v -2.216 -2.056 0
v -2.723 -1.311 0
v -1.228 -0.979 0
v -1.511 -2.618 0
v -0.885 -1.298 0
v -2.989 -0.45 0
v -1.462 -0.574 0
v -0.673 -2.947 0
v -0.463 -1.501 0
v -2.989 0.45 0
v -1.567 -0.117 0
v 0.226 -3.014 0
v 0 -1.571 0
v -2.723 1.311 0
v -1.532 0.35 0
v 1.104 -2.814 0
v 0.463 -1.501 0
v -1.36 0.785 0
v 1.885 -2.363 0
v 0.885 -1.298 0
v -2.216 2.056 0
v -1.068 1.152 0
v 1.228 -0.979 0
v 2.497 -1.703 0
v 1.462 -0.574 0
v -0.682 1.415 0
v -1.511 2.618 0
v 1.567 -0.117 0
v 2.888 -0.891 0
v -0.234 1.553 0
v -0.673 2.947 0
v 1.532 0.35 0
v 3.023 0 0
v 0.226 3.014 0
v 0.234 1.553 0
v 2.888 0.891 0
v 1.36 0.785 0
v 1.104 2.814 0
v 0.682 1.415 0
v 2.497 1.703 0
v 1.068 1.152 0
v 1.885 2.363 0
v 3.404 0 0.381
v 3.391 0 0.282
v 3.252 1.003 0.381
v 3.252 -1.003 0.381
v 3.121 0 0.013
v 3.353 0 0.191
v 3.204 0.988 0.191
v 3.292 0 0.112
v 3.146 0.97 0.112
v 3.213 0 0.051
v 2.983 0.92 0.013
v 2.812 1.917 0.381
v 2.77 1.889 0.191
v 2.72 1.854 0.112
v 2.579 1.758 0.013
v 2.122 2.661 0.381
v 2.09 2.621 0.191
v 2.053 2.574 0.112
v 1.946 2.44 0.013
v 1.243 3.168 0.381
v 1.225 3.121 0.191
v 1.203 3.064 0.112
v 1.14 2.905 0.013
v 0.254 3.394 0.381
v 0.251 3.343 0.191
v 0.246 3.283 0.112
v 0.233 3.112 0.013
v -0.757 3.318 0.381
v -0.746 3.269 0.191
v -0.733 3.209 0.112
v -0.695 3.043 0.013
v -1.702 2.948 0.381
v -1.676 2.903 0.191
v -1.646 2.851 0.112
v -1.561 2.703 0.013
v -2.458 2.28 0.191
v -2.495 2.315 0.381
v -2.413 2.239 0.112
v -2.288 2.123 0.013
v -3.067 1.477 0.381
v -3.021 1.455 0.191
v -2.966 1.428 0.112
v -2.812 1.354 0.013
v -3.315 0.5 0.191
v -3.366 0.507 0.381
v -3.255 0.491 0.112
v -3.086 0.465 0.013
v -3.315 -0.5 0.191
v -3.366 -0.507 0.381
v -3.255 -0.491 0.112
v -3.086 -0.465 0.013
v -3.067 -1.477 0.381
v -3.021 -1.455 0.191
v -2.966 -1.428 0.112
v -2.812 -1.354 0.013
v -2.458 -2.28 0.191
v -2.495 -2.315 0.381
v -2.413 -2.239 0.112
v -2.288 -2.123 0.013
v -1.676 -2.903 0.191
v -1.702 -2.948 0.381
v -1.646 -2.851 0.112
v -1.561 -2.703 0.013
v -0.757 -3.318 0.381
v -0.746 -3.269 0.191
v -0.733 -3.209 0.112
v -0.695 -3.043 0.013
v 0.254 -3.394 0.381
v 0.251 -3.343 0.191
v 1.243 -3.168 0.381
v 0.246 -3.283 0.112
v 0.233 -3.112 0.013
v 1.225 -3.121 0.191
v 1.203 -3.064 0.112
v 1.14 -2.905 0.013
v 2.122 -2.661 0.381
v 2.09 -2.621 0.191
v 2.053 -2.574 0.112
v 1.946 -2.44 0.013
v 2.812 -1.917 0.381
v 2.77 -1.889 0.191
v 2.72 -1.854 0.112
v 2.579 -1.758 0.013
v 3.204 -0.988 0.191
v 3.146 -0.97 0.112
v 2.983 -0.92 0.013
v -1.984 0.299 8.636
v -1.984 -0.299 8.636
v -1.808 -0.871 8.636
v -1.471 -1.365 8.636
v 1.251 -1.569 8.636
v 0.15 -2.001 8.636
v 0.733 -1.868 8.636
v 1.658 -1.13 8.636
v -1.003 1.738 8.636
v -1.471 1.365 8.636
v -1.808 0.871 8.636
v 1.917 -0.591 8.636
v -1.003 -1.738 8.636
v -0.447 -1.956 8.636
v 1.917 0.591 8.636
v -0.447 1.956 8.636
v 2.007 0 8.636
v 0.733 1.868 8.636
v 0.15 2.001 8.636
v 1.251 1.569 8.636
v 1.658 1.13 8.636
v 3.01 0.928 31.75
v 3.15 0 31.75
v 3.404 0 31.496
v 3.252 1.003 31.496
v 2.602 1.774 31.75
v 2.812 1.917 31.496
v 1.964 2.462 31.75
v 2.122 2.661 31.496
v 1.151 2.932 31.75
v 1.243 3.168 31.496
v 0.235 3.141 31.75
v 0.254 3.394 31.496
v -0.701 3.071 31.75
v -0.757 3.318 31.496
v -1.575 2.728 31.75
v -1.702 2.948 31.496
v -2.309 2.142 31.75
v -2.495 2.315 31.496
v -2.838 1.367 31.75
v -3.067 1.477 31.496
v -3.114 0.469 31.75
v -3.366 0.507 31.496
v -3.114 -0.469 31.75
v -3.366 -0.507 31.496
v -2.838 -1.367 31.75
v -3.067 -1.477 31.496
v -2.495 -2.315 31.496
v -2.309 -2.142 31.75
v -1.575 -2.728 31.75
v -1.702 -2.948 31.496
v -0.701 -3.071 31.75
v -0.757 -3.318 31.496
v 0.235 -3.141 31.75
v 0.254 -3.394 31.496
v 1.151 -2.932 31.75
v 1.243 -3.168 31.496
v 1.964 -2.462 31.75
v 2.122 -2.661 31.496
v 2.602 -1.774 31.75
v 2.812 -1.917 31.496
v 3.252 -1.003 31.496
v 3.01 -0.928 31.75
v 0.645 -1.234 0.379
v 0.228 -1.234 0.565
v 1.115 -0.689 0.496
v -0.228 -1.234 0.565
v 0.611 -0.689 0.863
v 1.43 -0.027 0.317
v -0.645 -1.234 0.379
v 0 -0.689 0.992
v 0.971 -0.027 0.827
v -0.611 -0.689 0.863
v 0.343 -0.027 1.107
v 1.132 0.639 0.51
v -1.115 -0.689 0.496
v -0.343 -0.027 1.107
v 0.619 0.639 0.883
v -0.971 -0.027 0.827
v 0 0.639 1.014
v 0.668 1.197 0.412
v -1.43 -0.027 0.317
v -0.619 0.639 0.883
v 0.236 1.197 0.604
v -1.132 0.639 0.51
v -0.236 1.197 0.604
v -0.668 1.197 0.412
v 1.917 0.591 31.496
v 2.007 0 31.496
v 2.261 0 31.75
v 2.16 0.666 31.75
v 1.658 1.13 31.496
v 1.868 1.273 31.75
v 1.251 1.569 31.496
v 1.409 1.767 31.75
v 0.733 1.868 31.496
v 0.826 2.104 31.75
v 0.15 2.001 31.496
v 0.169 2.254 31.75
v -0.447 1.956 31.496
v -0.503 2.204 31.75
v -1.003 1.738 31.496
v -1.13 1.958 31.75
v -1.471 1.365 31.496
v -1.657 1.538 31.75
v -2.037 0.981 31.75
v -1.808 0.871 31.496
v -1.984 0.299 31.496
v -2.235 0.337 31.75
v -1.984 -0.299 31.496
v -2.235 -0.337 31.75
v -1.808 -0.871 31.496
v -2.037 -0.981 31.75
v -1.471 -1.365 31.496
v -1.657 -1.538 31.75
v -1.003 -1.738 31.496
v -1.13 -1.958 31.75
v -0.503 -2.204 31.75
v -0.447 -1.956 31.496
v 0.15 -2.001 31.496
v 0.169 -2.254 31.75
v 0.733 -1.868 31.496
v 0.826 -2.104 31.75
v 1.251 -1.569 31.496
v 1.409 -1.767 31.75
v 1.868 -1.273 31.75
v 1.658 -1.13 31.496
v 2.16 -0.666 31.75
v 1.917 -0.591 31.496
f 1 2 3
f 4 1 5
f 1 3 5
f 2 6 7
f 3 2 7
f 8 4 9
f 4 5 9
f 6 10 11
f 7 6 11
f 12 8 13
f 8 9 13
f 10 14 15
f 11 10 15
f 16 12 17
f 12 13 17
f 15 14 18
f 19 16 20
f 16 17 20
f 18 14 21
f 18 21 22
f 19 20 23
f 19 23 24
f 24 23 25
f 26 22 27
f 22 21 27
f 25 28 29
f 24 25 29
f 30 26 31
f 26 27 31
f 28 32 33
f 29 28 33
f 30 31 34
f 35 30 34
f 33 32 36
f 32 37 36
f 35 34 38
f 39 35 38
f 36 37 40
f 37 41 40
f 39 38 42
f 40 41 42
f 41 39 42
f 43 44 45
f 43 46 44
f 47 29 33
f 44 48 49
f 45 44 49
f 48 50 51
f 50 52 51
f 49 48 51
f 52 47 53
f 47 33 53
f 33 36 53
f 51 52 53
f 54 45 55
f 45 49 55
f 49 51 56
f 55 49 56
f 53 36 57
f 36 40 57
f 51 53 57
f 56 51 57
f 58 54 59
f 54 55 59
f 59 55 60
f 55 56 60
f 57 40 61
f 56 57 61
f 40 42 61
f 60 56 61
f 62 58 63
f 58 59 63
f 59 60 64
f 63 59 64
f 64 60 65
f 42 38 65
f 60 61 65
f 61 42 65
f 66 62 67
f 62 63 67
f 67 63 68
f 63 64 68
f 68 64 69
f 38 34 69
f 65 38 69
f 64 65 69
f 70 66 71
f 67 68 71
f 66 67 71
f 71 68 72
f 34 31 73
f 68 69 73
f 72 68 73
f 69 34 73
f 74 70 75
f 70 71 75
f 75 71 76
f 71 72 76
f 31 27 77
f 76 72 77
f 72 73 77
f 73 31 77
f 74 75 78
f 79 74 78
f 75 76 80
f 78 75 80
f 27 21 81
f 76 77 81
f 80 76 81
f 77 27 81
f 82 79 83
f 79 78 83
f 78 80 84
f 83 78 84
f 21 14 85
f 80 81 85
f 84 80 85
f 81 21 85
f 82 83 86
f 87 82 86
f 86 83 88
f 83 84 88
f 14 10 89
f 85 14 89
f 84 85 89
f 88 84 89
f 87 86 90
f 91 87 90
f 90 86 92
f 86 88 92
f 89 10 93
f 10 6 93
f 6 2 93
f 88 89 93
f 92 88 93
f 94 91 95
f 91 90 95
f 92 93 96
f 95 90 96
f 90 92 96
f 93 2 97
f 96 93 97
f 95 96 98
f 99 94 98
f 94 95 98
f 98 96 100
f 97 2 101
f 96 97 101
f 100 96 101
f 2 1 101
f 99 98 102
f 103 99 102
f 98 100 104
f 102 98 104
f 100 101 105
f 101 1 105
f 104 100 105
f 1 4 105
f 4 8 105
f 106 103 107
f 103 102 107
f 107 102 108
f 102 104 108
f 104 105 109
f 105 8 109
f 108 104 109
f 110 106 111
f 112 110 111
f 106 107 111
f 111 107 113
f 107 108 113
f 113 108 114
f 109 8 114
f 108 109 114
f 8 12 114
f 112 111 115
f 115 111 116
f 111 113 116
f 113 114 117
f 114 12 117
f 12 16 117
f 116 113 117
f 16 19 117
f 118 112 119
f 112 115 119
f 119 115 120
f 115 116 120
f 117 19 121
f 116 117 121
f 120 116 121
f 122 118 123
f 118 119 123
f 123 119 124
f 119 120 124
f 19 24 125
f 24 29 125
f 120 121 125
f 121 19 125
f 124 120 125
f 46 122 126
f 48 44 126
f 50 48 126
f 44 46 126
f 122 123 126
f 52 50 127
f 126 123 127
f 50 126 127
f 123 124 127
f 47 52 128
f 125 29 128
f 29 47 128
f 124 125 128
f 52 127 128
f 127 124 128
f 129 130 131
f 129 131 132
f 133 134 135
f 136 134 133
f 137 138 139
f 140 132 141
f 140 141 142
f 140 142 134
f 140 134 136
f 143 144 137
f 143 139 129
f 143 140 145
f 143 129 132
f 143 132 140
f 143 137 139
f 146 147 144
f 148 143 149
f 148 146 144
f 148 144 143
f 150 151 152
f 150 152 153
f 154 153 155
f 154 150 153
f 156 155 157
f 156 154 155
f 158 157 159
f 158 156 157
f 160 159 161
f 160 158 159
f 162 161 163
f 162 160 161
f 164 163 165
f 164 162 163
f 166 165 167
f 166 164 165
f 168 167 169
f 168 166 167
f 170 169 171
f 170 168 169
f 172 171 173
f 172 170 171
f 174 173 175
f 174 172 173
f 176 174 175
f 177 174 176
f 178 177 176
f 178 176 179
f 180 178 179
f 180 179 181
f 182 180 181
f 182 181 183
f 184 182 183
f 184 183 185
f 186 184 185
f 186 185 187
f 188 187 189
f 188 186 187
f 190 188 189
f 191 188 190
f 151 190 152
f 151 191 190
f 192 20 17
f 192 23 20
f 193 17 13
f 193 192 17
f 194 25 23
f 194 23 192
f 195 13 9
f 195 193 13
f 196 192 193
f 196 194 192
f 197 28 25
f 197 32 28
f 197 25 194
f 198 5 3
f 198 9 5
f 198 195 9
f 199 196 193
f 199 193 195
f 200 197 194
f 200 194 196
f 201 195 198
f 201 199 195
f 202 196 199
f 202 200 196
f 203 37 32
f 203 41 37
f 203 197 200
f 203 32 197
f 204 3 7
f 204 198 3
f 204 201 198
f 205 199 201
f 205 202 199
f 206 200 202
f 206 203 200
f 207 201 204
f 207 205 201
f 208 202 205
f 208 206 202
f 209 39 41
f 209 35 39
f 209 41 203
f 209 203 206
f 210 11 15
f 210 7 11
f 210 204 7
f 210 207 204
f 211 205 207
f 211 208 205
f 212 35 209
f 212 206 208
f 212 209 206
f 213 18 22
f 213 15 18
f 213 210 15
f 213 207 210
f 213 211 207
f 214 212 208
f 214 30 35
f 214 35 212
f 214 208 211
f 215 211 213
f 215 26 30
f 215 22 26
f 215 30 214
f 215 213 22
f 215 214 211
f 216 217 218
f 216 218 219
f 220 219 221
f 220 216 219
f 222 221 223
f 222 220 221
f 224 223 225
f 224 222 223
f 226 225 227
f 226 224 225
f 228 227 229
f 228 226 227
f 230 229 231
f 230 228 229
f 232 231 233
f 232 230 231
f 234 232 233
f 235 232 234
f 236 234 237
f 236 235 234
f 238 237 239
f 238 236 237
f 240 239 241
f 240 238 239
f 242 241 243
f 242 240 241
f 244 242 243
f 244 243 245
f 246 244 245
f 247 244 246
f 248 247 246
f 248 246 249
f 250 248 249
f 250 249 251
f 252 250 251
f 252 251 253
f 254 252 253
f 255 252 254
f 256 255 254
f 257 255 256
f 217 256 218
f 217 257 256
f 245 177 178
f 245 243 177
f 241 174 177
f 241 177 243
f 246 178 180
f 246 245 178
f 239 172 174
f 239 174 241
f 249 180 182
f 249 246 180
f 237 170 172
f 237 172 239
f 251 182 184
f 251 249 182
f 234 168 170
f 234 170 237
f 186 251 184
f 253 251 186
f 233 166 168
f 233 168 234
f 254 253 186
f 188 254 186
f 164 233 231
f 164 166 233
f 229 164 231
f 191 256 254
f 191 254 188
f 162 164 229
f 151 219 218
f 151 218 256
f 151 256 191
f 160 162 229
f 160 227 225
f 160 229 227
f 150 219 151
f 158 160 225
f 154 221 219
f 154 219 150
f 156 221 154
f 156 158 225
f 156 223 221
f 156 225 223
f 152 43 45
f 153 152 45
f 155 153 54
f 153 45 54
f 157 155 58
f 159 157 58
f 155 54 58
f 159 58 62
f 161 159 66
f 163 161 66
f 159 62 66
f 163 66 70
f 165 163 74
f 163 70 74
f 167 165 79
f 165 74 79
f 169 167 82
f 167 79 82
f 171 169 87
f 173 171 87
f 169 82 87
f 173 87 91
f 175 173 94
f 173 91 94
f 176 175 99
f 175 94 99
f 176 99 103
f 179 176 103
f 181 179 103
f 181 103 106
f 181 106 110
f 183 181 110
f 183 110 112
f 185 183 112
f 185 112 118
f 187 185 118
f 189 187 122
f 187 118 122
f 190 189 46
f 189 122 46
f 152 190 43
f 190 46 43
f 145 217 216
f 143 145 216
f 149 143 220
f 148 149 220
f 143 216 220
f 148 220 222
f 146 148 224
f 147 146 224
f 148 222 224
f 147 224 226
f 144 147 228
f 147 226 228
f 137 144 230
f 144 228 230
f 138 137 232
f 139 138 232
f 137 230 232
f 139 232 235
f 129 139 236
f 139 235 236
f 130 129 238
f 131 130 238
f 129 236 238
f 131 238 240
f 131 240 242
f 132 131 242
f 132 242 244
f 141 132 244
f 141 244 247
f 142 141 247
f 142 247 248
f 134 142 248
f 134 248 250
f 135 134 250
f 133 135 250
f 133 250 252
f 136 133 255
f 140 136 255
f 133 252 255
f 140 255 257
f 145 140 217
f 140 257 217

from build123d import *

# Parameters (mm, degrees)
F0_R     = 3.4036
F1_DEPTH = 31.75
F2_R     = 2.0066
F3_DEPTH = 23.114
F7_R     = 0.381
F8_SIZE  = 0.254


with BuildPart() as f1:
    # F0 (on Top) → F1 (new body)
    with BuildSketch(Plane.XY):
        Circle(F0_R)
    extrude(amount=F1_DEPTH)

    # F2 (on face) → F3 (cut)
    with BuildSketch(Plane.XY.offset(31.75)):
        Circle(F2_R)
    extrude(amount=-F3_DEPTH, mode=Mode.SUBTRACT)

    # F5 (on offset) → F6 (revolve, cut)
    with BuildSketch(Plane(origin=(0, 0, -0.508), x_dir=(1, 0, 0), z_dir=(0, 0, -1))):
        with BuildLine():
            ThreePointArc((0, 1.651), (-1.651, 0), (0, -1.651))
            Line((0, -1.651), (0, 1.651))
        make_face()
    revolve(axis=Axis((0, -0.148408, -0.508), (0, -1, 0)), mode=Mode.SUBTRACT)

    # F7
    f7_edges = [f1.edges().sort_by_distance(p)[0] for p in [
        (-3.4036, 0, 0),
    ]]
    fillet(f7_edges, radius=F7_R)

    # F8
    f8_edges = [f1.edges().sort_by_distance(p)[0] for p in [
        (-3.4036, 0, 31.75),
        (-2.0066, 0, 31.75),
    ]]
    chamfer(f8_edges, length=F8_SIZE)


solid = f1.part
